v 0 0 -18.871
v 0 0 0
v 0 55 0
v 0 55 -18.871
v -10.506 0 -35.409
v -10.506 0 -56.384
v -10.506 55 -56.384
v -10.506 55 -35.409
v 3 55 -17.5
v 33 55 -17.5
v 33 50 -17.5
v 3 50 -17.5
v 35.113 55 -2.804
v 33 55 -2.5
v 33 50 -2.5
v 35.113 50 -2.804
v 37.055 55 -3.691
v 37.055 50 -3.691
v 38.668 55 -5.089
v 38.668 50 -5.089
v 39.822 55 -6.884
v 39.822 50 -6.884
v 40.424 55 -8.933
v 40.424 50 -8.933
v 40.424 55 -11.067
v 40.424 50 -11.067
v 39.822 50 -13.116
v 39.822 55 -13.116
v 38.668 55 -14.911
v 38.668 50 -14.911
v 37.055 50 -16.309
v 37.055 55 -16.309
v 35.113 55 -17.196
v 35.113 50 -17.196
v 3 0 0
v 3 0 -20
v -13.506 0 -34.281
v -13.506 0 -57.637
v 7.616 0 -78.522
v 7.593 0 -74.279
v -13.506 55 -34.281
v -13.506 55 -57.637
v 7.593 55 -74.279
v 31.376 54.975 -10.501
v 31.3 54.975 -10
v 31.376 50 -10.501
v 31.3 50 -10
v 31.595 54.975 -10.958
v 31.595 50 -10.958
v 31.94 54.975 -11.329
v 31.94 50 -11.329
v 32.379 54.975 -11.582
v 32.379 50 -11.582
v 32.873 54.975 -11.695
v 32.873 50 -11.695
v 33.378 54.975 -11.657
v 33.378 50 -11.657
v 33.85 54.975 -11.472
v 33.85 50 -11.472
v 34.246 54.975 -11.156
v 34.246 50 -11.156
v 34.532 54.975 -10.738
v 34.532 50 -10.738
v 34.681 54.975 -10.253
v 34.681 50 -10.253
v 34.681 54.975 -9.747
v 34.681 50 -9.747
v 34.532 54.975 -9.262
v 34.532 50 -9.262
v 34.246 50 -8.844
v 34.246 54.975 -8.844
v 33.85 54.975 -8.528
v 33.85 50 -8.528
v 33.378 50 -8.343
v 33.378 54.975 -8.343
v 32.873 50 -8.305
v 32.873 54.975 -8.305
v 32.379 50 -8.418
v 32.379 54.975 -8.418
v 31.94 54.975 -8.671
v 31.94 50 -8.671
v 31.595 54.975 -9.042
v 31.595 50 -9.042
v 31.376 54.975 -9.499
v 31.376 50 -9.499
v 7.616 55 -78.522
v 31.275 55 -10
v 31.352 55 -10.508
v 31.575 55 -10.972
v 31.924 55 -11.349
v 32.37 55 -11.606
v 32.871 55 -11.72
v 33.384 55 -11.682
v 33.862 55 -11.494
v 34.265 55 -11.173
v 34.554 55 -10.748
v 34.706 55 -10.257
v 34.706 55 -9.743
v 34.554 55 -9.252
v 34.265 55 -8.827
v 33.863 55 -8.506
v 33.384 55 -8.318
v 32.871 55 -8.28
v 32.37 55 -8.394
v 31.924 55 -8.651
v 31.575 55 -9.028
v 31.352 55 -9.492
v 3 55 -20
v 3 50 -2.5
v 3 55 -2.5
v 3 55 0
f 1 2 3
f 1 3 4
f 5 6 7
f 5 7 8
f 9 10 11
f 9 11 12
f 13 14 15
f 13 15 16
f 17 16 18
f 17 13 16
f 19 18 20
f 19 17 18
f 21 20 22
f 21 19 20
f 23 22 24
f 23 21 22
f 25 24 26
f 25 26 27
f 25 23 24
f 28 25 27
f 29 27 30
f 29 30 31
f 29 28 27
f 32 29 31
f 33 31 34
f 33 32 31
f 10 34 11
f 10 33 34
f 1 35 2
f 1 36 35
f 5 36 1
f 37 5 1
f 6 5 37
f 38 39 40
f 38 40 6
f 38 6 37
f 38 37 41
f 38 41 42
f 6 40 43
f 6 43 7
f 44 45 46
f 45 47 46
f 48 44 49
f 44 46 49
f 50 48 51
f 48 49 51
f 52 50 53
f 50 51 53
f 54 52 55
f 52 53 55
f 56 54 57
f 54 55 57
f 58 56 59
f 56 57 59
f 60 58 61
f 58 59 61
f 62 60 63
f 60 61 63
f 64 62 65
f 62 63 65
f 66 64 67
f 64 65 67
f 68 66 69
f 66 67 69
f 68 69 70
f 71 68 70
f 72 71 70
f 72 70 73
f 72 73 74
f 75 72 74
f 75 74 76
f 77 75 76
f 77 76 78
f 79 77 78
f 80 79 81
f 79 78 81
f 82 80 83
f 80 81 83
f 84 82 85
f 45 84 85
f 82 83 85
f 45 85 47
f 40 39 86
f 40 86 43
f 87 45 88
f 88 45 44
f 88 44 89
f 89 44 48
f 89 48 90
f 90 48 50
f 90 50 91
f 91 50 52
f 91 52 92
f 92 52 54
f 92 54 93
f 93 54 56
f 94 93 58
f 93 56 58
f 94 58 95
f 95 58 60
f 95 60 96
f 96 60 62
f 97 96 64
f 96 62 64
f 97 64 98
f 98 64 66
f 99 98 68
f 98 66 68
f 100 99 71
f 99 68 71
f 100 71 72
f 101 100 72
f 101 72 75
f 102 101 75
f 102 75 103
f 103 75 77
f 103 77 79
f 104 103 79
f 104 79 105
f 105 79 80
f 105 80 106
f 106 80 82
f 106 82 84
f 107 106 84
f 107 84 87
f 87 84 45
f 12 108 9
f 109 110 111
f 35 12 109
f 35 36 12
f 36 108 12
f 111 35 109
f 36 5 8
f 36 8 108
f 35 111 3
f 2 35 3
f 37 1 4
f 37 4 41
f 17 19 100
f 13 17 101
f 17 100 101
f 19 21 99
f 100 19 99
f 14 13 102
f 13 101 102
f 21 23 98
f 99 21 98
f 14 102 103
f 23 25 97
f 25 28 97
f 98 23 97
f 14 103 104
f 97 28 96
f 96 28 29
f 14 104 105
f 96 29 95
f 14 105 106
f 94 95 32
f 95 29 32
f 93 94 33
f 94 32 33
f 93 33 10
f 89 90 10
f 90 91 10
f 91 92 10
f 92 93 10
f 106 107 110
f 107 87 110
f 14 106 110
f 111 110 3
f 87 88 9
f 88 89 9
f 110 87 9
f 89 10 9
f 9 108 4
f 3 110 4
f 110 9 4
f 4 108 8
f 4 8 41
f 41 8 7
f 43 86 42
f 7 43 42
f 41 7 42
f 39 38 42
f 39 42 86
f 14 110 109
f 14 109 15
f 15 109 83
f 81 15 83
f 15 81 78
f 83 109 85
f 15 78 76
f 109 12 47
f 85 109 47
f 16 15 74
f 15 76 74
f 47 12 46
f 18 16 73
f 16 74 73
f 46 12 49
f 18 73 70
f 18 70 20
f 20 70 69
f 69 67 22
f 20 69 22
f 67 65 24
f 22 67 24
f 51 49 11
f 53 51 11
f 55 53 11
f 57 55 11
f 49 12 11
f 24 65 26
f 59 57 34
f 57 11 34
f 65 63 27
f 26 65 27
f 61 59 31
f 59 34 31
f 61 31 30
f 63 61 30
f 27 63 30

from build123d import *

# Parameters (mm, degrees)
BOSS_EXTRUDE1_DEPTH            = 55
BOSS_EXTRUDE2_START            = 55
BOSS_EXTRUDE2_DEPTH            = 5
M3_CLEARANCE_HOLE1_D           = 3.4
M3_CLEARANCE_HOLE1_CSINK_D     = 3.45
M3_CLEARANCE_HOLE1_CSINK_ANGLE = 90


with BuildPart() as part:
    # Sketch1 → Boss-Extrude1 (new body)
    with BuildSketch(Plane(origin=(0, 0, 0), x_dir=(1, 0, 0), z_dir=(0, 1, 0))):
        Polygon((3, 0), (0, 0), (0, 18.87138772), (-13.505514799, 34.280690781), (-13.505514799, 57.637057616), (7.616499063, 78.521745479), (7.592529724, 74.279172502), (-10.505514799, 56.384476794), (-10.505514799, 35.409303061), (3, 20), align=None)
    extrude(amount=BOSS_EXTRUDE1_DEPTH)

    # Sketch1<3> → Boss-Extrude2 (add)
    with BuildSketch(Plane(origin=(0, 0, 0), x_dir=(1, 0, 0), z_dir=(0, 1, 0)).offset(BOSS_EXTRUDE2_START)):
        with BuildLine():
            Line((3, 17.5), (3, 2.5))
            Line((3, 2.5), (33, 2.5))
            ThreePointArc((33, 2.5), (40.5, 10), (33, 17.5))
            Line((33, 17.5), (3, 17.5))
        make_face()
    extrude(amount=-BOSS_EXTRUDE2_DEPTH)

    # M3 Clearance Hole1 (through all)
    with Locations(Plane(origin=(0, 55, 0), x_dir=(1, 0, 0), z_dir=(0, 1, 0))):
        with Locations((33, 10)):
            CounterSinkHole(M3_CLEARANCE_HOLE1_D / 2, M3_CLEARANCE_HOLE1_CSINK_D / 2, counter_sink_angle=M3_CLEARANCE_HOLE1_CSINK_ANGLE)


solid = part.part
